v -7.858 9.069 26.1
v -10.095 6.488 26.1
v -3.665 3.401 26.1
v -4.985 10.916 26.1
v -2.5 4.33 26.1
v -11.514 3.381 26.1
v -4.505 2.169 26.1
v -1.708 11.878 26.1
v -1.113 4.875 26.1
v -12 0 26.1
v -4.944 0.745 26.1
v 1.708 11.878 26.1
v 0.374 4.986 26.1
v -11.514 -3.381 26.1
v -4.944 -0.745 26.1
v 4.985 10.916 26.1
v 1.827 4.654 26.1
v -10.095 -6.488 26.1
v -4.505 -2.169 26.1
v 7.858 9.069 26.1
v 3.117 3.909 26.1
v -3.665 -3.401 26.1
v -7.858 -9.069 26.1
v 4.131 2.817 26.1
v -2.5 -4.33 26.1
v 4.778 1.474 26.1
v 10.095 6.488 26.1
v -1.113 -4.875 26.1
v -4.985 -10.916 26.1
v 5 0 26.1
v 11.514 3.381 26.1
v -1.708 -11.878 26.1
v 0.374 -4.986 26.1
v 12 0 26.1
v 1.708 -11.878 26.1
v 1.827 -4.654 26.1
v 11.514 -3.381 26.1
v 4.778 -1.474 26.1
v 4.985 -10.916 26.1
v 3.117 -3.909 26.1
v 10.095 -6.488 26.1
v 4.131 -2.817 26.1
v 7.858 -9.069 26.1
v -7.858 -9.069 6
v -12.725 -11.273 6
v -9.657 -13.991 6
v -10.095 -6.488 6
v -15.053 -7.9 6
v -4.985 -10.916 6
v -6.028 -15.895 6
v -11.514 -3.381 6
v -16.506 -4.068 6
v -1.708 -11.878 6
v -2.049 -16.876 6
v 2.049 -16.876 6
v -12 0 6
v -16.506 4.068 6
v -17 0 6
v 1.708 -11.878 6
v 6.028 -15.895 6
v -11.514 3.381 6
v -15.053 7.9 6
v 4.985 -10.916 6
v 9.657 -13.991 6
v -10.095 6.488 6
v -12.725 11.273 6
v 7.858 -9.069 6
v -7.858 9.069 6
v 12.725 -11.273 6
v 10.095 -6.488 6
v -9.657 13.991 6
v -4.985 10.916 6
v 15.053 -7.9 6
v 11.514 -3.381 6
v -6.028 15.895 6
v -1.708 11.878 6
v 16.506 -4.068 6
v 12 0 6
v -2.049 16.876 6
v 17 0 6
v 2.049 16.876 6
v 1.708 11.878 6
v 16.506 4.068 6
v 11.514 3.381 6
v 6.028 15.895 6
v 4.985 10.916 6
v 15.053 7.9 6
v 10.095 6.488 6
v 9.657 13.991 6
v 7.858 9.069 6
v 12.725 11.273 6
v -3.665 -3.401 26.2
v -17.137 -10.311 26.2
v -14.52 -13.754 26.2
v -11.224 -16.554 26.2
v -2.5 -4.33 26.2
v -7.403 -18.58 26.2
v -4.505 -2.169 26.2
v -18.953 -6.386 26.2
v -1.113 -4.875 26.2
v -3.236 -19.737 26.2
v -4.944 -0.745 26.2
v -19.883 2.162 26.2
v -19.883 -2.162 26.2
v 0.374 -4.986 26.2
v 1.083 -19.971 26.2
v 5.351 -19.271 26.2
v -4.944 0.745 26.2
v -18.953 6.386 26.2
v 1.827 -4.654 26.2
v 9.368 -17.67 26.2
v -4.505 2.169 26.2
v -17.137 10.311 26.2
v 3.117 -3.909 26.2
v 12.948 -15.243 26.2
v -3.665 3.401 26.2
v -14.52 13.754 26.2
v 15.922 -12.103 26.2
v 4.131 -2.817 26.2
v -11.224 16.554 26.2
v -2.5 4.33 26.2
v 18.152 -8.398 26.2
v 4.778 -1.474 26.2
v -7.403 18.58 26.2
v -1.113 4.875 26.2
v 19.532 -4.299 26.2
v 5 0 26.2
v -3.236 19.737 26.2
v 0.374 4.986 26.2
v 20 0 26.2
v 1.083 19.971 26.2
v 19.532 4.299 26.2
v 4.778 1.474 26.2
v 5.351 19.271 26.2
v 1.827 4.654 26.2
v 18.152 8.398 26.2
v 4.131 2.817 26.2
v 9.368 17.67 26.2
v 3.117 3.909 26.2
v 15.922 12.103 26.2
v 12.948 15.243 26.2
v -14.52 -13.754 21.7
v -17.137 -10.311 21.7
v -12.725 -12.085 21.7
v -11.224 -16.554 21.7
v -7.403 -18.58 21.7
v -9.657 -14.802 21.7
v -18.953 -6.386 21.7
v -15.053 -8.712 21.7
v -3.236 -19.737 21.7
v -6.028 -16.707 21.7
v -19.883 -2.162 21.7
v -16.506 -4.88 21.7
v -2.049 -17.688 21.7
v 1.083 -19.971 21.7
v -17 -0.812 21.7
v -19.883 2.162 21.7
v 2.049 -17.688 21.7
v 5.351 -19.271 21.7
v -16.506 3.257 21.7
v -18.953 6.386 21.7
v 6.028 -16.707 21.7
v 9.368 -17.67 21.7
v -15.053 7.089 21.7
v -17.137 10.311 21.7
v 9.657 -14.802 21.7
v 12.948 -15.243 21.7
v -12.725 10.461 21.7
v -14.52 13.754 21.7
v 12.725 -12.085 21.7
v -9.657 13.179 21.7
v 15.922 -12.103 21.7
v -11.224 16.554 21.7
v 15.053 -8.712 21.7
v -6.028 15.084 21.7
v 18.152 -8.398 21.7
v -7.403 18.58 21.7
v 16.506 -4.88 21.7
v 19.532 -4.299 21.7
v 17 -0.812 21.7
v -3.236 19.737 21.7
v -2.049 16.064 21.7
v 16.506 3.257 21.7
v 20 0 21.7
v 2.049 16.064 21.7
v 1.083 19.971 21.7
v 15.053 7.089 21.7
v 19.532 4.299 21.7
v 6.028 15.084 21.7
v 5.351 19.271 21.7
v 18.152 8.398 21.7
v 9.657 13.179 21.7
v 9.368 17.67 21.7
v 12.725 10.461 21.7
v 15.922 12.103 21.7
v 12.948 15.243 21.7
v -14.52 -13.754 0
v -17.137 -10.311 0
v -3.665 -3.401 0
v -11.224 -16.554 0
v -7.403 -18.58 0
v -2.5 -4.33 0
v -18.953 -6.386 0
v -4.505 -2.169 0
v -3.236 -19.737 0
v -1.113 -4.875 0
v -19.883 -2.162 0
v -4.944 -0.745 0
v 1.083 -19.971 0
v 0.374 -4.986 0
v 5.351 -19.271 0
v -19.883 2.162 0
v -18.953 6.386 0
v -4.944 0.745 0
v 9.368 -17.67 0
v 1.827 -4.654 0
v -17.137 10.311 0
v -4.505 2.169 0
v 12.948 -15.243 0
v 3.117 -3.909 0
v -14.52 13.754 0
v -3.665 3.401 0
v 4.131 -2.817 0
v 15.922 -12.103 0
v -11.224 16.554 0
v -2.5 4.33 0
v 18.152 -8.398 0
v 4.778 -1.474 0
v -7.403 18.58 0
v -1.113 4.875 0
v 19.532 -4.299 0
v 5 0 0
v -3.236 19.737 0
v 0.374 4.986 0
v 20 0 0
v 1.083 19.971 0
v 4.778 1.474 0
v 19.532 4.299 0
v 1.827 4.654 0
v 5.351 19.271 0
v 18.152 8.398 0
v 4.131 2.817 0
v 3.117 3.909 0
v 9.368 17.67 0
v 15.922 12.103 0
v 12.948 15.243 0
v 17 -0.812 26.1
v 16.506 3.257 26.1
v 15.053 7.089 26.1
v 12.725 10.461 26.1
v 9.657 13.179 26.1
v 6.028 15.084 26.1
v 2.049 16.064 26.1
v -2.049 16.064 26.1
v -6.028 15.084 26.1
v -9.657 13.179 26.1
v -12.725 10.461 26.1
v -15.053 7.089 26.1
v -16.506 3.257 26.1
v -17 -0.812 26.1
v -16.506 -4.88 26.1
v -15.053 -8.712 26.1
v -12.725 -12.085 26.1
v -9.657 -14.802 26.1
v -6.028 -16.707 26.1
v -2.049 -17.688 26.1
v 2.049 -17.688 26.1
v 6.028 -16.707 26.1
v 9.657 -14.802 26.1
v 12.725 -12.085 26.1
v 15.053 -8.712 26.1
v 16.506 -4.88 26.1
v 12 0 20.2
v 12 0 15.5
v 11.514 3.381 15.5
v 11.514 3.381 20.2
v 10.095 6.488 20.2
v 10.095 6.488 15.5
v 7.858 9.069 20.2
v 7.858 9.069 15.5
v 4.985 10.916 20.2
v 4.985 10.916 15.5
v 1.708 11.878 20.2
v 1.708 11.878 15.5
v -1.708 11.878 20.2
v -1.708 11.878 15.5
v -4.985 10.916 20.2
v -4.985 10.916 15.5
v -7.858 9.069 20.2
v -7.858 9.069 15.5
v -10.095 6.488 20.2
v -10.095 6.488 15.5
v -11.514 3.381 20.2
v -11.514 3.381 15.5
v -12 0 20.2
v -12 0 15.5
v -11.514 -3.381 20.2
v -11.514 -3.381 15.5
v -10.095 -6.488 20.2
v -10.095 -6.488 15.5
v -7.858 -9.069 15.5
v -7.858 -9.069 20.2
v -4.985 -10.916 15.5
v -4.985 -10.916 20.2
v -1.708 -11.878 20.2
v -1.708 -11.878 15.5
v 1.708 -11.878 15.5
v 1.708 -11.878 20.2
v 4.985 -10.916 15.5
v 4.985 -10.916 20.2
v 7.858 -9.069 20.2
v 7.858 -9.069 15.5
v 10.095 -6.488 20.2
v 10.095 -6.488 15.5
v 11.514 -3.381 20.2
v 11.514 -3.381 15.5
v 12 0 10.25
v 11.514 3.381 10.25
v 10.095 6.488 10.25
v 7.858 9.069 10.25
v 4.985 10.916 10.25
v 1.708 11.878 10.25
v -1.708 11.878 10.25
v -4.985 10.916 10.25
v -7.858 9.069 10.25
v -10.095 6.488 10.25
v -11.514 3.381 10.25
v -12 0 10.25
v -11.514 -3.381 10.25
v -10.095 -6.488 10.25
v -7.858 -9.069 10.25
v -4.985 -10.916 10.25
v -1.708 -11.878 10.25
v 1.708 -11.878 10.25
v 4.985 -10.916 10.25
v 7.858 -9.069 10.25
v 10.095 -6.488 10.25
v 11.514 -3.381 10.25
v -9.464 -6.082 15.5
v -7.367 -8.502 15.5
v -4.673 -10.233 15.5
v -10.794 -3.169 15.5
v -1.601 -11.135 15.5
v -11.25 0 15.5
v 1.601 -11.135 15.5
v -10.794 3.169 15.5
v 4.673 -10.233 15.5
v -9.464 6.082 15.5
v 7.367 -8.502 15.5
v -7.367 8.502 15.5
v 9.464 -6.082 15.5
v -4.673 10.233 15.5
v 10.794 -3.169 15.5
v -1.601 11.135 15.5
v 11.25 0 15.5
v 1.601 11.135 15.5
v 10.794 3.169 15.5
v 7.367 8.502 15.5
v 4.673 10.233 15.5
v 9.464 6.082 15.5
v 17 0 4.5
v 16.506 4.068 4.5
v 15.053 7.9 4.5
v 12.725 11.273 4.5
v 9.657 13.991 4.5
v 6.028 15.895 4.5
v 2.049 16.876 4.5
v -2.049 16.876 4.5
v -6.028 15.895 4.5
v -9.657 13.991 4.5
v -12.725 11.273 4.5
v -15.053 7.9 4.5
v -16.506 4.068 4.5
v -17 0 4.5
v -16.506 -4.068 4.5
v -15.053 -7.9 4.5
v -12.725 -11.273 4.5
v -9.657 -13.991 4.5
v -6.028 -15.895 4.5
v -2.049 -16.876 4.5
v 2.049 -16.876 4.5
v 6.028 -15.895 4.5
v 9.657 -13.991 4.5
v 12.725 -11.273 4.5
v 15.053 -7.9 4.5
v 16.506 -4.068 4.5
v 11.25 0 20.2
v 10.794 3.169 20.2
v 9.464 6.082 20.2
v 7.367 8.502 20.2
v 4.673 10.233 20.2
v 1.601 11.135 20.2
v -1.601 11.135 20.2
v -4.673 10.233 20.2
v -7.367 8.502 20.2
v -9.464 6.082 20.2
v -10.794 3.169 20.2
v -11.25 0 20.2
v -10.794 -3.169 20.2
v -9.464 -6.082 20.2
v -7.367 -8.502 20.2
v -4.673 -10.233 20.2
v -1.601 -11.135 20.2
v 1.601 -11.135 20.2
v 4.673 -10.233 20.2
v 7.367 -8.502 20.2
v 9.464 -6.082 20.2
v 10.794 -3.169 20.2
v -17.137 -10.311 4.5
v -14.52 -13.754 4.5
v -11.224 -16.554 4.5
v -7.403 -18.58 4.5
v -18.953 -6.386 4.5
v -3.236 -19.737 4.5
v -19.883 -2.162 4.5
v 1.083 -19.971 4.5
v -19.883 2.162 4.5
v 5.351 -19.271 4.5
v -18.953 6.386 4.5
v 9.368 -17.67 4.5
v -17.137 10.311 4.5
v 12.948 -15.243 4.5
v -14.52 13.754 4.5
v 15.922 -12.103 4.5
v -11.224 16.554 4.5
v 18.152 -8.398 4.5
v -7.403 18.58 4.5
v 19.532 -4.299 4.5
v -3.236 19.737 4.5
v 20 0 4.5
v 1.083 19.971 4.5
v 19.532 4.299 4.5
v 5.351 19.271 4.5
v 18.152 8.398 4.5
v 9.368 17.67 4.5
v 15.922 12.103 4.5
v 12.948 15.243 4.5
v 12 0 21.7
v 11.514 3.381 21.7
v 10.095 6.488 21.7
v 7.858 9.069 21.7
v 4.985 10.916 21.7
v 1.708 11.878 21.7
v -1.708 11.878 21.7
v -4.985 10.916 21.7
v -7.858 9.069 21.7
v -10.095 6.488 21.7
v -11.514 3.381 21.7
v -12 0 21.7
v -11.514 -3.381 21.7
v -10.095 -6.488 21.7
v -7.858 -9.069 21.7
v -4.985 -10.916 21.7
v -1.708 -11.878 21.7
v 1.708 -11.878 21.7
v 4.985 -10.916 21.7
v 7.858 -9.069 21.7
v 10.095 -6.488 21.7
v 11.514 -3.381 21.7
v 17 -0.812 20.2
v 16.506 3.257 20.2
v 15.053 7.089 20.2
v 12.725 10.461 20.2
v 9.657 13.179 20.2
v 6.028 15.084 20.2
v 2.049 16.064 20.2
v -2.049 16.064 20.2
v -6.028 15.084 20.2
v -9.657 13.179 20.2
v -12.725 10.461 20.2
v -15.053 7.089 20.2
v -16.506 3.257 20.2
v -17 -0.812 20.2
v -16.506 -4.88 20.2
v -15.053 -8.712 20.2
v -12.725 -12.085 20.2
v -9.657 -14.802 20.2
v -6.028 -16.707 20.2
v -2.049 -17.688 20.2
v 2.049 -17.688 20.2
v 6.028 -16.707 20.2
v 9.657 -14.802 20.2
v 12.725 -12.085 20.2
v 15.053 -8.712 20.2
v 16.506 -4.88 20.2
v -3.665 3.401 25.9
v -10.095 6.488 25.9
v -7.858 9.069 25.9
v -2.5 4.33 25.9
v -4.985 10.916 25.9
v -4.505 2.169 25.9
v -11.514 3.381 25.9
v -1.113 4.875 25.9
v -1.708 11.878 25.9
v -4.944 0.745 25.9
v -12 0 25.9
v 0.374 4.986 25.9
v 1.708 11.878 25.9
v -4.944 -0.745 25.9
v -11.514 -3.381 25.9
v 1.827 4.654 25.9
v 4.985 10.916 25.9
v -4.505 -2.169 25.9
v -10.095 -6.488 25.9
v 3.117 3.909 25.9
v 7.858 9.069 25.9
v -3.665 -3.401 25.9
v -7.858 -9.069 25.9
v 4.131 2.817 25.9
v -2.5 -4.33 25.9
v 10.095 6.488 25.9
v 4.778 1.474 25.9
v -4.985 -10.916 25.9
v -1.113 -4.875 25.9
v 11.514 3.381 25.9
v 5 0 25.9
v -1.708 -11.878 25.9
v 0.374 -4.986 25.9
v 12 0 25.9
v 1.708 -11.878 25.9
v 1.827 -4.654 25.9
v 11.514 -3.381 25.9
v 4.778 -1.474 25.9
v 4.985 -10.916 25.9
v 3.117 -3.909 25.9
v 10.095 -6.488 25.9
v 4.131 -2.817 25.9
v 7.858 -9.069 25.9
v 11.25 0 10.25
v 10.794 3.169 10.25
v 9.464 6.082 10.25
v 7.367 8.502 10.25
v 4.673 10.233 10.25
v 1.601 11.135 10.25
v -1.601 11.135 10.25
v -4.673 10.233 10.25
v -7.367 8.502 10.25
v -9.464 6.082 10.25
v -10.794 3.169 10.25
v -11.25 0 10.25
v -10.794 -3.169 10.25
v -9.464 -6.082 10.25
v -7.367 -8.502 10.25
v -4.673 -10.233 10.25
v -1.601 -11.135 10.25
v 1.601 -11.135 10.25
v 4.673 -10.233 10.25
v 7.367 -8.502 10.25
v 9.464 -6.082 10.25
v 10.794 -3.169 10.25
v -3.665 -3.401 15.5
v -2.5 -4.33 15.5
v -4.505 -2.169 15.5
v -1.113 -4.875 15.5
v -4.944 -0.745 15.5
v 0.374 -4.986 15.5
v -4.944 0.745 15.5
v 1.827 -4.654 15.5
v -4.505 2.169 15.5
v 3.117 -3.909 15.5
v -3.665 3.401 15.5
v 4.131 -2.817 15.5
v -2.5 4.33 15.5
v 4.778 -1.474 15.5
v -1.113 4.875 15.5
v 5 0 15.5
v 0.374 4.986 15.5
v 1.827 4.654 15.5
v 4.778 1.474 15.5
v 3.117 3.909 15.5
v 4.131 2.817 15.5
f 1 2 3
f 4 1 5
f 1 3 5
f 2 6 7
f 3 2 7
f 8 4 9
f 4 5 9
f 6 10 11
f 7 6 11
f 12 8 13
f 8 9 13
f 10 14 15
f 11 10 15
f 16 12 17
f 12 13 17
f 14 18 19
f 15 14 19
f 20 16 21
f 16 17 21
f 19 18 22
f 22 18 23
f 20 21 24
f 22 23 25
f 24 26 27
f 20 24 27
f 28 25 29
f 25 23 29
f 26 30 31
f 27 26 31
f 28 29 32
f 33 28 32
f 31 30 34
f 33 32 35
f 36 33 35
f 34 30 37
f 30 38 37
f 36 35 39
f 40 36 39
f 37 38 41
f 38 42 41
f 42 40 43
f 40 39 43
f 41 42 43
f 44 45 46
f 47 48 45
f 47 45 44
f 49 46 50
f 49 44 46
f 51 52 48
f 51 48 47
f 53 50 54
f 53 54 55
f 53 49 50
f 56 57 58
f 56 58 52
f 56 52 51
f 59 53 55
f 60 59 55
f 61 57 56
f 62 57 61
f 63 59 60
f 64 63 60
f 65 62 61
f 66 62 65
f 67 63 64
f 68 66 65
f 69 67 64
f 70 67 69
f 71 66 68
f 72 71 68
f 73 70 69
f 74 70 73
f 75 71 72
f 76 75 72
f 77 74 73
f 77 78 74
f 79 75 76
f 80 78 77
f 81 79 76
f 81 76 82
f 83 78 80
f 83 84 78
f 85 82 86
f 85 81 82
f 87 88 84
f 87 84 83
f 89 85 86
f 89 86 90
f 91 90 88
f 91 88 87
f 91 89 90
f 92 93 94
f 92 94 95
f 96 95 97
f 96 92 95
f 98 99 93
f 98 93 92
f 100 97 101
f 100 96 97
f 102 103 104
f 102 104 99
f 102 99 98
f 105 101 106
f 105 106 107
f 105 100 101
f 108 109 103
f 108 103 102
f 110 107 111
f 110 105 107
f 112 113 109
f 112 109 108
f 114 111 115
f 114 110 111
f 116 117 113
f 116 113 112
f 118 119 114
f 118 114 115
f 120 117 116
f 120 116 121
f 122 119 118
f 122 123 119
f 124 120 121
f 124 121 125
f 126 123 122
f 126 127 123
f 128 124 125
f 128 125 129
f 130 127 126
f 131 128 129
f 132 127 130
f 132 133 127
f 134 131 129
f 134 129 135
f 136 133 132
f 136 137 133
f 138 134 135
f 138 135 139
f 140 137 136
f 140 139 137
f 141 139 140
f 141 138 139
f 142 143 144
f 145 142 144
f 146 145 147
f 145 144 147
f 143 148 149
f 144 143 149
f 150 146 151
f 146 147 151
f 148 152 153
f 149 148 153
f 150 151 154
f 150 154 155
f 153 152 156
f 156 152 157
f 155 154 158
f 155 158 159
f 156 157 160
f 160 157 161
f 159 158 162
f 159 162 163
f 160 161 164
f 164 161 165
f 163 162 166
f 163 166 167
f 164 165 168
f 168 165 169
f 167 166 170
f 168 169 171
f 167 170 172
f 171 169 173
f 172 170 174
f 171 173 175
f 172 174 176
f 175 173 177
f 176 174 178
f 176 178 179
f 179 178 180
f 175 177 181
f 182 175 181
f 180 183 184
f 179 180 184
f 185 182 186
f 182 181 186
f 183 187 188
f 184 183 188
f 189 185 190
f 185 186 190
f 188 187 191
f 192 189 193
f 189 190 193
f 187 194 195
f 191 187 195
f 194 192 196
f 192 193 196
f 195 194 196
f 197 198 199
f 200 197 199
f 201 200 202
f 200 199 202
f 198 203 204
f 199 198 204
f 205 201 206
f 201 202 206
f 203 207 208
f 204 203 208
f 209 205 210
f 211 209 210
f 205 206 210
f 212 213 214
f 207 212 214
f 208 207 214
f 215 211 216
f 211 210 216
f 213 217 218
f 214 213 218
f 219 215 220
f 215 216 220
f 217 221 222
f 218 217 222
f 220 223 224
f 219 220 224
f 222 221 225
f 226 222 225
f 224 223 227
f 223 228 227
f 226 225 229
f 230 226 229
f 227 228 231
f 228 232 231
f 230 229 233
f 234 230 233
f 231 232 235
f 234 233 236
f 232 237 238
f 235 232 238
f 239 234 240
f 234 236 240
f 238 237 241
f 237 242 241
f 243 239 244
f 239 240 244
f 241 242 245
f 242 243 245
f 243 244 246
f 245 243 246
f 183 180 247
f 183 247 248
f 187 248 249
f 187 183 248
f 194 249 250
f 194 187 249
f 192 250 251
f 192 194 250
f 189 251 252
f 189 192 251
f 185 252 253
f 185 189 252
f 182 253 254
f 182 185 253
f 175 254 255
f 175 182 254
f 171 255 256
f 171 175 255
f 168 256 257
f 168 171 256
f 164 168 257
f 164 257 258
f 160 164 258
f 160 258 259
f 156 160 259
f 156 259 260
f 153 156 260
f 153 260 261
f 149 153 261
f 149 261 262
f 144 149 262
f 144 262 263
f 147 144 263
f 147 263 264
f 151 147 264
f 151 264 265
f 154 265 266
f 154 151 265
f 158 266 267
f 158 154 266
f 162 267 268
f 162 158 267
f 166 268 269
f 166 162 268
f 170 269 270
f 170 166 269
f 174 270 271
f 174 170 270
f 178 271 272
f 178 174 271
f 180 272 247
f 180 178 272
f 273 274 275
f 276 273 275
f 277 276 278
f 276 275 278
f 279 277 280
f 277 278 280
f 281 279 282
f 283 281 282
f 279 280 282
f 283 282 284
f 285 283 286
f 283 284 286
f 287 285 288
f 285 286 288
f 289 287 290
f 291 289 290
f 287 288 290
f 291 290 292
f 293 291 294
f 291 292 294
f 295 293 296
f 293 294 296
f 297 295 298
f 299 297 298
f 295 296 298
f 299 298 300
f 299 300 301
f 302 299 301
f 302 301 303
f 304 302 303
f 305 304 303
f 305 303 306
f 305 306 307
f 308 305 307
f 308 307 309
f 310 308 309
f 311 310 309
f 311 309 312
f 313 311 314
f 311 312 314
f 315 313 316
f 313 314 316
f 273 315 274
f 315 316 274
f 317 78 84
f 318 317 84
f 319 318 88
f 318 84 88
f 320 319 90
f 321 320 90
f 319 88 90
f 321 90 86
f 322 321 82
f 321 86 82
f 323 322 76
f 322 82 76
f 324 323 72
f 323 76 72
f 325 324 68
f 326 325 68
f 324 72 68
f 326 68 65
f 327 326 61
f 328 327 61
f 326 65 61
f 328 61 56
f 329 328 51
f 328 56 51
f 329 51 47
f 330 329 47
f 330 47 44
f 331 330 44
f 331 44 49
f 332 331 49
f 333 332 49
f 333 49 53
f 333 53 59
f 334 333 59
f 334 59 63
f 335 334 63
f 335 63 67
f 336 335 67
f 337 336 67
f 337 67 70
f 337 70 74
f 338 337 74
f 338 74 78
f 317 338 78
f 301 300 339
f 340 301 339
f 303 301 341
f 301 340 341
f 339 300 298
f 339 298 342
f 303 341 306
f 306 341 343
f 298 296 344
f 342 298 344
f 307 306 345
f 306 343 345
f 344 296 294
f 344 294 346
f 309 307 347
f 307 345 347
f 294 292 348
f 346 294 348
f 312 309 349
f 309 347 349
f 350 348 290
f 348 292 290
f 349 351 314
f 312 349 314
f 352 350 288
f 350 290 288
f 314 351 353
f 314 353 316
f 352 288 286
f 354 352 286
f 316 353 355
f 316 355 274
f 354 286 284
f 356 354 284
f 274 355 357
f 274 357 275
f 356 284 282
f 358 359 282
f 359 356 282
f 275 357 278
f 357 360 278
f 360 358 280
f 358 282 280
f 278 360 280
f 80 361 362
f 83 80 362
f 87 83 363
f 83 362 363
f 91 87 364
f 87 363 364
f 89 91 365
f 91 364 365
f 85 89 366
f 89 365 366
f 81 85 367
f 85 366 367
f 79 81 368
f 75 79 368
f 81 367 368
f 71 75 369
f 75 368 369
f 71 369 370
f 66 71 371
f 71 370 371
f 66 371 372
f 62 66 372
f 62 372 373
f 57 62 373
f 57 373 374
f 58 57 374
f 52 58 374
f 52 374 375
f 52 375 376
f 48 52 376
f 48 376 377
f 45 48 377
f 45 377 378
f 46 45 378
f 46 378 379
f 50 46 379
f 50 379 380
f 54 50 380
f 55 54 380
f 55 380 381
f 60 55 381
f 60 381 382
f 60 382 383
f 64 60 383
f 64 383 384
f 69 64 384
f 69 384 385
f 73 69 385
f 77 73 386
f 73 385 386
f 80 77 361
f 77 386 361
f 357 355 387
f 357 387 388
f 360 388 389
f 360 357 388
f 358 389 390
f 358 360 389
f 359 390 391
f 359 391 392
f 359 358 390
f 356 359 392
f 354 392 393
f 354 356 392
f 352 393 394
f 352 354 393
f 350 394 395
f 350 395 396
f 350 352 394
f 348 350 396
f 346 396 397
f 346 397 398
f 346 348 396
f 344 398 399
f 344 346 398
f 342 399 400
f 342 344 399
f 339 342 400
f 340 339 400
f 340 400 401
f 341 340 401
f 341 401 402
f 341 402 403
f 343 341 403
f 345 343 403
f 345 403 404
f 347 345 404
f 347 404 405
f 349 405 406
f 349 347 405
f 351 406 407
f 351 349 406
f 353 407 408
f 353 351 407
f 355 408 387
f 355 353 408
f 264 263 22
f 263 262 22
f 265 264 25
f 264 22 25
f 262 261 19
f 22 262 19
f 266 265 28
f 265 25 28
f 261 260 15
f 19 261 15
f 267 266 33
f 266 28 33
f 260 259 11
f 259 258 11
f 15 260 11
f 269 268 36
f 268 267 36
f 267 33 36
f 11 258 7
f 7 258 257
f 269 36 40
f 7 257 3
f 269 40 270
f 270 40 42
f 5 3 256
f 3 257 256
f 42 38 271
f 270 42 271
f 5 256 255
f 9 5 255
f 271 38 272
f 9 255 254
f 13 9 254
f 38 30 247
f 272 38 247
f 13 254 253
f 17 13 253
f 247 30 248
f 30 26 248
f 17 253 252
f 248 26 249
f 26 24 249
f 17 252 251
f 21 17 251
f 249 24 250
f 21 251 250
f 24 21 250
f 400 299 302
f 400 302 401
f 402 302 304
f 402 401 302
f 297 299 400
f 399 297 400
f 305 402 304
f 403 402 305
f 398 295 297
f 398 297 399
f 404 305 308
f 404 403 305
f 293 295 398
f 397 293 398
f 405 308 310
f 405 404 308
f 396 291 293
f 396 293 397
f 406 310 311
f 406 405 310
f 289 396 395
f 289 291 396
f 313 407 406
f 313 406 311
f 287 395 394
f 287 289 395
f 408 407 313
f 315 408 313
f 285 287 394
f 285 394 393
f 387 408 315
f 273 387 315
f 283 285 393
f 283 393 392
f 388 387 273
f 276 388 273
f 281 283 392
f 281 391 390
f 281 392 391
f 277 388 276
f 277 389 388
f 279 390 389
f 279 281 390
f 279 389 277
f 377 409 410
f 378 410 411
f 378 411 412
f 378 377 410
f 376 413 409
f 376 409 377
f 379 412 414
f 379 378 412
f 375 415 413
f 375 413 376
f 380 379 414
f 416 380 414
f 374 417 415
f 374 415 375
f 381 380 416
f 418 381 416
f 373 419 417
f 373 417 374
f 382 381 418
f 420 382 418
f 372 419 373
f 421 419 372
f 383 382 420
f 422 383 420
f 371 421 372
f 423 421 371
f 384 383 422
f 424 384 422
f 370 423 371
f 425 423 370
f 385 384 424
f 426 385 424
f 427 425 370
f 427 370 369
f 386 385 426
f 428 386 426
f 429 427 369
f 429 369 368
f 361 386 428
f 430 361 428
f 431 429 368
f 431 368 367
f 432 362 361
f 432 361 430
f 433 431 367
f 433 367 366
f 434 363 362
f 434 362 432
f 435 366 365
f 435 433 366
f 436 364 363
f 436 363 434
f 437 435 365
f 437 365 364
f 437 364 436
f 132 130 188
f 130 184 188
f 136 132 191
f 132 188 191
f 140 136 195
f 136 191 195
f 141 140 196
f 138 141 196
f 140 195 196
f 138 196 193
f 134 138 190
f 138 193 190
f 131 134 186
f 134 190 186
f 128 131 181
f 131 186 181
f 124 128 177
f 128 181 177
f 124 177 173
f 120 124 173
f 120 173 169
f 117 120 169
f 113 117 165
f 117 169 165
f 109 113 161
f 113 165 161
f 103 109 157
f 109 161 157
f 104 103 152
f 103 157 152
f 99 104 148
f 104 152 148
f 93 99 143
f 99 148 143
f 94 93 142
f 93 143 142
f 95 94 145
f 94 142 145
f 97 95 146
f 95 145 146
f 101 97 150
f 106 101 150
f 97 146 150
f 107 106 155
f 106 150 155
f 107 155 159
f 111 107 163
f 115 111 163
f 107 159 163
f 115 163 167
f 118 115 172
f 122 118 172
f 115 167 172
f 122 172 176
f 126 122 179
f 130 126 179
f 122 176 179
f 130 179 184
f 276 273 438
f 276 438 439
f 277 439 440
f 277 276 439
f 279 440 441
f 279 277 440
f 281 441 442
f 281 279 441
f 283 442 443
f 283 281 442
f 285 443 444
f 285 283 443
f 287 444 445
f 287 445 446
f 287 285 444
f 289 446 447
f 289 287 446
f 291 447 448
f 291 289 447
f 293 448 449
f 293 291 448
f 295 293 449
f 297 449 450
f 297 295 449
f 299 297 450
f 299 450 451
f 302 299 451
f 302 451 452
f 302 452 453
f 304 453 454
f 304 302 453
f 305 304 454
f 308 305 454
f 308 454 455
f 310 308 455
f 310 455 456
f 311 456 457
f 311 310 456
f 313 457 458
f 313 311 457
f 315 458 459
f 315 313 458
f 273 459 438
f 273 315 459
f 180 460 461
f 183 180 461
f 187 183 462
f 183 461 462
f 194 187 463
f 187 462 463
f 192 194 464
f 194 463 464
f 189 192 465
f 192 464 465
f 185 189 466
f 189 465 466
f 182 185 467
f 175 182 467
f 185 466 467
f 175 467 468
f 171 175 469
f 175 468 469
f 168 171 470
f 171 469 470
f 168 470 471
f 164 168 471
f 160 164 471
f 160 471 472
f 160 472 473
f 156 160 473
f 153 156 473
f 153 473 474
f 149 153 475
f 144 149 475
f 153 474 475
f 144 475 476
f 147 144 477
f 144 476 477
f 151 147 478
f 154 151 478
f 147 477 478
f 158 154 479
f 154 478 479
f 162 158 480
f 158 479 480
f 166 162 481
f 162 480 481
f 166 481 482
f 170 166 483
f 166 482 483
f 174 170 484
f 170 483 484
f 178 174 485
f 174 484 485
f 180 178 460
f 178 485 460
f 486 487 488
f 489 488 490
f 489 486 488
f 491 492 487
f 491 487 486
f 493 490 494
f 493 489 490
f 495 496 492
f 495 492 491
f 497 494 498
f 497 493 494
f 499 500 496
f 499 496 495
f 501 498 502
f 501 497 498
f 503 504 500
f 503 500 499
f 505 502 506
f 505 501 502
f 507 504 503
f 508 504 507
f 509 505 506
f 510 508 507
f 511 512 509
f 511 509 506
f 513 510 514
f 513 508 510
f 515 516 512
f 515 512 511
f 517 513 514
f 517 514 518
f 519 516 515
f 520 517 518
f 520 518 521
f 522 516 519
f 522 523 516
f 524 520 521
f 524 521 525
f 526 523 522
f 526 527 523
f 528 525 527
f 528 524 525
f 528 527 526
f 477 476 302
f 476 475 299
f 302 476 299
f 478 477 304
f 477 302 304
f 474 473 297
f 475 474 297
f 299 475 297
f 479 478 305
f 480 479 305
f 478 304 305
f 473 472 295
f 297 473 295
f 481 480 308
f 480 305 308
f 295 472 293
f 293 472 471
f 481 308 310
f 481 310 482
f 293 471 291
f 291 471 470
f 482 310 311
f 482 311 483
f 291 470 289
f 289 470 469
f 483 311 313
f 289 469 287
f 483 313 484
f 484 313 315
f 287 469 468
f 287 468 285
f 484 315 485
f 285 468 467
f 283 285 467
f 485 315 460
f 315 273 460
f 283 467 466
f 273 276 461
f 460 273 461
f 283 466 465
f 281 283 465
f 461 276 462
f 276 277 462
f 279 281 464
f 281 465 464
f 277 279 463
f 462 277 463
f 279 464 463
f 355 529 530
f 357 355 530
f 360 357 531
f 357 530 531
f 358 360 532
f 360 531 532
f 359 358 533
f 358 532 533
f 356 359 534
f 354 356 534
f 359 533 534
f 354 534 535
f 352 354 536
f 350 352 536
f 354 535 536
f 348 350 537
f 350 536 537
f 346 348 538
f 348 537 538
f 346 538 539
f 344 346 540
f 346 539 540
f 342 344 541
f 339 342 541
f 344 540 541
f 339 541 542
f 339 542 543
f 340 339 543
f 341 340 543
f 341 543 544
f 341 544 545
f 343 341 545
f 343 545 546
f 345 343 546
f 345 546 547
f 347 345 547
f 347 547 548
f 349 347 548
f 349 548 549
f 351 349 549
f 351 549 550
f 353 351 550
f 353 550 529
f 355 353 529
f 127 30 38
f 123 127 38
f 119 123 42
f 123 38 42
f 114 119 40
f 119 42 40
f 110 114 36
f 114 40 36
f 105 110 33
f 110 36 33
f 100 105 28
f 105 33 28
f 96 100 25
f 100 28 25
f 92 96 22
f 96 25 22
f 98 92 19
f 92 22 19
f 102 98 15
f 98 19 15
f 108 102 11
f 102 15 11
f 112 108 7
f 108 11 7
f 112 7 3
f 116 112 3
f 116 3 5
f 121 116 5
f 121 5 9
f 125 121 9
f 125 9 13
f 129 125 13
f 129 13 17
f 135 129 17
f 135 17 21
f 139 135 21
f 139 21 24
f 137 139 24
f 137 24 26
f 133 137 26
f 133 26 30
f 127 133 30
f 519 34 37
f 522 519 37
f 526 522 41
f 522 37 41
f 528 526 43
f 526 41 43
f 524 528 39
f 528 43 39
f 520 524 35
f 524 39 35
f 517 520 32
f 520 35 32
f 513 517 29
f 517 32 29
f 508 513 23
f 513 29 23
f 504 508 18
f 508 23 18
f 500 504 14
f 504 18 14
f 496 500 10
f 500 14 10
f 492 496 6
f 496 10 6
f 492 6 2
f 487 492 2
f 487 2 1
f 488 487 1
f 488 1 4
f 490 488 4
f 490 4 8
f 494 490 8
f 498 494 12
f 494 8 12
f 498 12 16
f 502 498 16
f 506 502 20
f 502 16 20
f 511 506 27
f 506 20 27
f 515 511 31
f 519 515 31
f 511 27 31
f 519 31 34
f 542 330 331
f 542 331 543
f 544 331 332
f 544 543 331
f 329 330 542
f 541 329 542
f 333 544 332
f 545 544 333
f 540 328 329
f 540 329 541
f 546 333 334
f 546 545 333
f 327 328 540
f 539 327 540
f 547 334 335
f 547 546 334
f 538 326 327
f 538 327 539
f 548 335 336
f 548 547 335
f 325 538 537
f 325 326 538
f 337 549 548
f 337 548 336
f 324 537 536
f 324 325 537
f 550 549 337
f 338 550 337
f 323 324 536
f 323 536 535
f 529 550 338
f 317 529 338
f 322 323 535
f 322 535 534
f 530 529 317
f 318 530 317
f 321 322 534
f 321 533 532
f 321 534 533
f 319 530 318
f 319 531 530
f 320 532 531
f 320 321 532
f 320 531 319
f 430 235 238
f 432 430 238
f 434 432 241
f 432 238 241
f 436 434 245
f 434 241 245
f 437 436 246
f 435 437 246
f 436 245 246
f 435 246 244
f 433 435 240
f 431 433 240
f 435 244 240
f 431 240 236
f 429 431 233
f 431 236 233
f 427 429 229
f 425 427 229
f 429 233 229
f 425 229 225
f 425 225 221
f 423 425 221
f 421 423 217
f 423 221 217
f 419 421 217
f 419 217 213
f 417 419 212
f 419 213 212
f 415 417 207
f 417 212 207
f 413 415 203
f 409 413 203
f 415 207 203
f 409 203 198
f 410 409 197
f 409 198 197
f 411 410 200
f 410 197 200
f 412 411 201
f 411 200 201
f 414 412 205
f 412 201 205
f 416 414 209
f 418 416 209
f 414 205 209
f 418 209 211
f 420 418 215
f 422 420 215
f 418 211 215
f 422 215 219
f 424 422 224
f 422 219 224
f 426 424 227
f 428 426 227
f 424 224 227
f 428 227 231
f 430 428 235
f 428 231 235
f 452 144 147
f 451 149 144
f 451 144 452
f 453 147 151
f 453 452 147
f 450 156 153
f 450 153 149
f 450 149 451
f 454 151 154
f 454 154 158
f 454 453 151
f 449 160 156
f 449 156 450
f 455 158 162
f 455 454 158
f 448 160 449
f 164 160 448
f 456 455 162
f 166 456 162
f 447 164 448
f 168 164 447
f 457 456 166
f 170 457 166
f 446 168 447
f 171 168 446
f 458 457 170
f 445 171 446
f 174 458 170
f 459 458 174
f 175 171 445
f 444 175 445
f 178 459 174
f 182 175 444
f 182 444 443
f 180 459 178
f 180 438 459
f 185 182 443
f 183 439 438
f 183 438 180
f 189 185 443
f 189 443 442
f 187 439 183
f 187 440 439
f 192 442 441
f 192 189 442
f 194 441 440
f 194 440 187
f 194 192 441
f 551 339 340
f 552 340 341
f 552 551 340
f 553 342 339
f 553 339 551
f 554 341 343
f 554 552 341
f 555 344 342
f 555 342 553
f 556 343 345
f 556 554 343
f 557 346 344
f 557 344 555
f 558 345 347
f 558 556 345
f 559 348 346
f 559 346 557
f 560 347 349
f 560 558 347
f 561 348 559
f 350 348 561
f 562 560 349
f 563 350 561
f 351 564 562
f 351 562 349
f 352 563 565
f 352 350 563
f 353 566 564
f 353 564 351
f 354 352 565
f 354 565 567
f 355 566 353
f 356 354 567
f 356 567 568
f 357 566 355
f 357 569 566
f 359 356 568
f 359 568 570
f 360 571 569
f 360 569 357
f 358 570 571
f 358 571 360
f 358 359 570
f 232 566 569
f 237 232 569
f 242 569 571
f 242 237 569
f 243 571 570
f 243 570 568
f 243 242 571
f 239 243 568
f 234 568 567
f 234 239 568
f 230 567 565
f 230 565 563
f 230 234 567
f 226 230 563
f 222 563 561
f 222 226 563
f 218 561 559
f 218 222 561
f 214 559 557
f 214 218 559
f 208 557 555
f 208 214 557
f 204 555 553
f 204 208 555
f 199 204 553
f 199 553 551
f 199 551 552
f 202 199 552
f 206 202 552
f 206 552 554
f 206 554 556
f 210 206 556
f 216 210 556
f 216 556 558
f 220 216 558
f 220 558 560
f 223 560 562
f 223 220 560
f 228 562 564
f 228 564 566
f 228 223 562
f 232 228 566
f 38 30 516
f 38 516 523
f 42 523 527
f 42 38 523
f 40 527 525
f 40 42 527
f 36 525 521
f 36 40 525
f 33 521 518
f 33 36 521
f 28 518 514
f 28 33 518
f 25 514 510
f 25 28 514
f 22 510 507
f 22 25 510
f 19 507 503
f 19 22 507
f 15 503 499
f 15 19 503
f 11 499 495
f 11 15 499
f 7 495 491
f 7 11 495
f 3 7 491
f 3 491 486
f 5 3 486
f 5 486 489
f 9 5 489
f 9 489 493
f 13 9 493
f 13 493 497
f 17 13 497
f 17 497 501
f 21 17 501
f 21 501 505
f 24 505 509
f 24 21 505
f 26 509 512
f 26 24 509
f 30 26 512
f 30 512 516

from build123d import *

# Parameters (mm, degrees)
F0_R      = 20
F0_R_2    = 17
F1_DEPTH  = 4.5
F0_R_3    = 12
F2_DEPTH  = 6
F0_R_4    = 11.25
F3_DEPTH  = 10.25
F0_R_5    = 5
F4_DEPTH  = 15.5
F5_R      = 12
F5_R_2    = 11.25
F6_DEPTH  = 4.7
F7_R      = 17
F7_R_2    = 12
F8_DEPTH  = 1.5
F9_R      = 20
F9_R_2    = 17
F10_DEPTH = 4.5
F11_R     = 20
F12_DEPTH = 0.1
F13_R     = 5
F14_DEPTH = 79
F15_R     = 12
F15_R_2   = 5
F16_DEPTH = 0.2


with BuildPart() as f1:
    # F0 (on Top) → F1 (new body)
    with BuildSketch(Plane.XY):
        Circle(F0_R)
        Circle(F0_R_2, mode=Mode.SUBTRACT)
    extrude(amount=F1_DEPTH)

    # F0 (on Top) → F2 (join)
    with BuildSketch(Plane.XY):
        Circle(F0_R_2)
        Circle(F0_R_3, mode=Mode.SUBTRACT)
    extrude(amount=F2_DEPTH)

    # F0 (on Top) → F3 (join)
    with BuildSketch(Plane.XY):
        Circle(F0_R_3)
        Circle(F0_R_4, mode=Mode.SUBTRACT)
    extrude(amount=F3_DEPTH)

    # F0 (on Top) → F4 (join)
    with BuildSketch(Plane.XY):
        Circle(F0_R_4)
        Circle(F0_R_5, mode=Mode.SUBTRACT)
    extrude(amount=F4_DEPTH)

    # F5 (on face) → F6 (join)
    with BuildSketch(Plane.XY.offset(15.5)):
        Circle(F5_R)
        Circle(F5_R_2, mode=Mode.SUBTRACT)
    extrude(amount=F6_DEPTH)


with BuildPart() as f8:
    # F7 (on face) → F8 (new body)
    with BuildSketch(Plane.XY.offset(20.2)):
        with Locations((0, -0.8117613615)):
            Circle(F7_R)
        Circle(F7_R_2, mode=Mode.SUBTRACT)
    extrude(amount=F8_DEPTH)


with BuildPart() as f10:
    # F9 (on face) → F10 (new body)
    with BuildSketch(Plane.XY.offset(21.7)):
        Circle(F9_R)
        with Locations((0, -0.8117613615)):
            Circle(F9_R_2, mode=Mode.SUBTRACT)
    extrude(amount=F10_DEPTH)

    # F11 (on face) → F12 (join)
    with BuildSketch(Plane.XY.offset(26.2)):
        Circle(F11_R)
    extrude(amount=-F12_DEPTH)

    # F13 (on face) → F14 (cut)
    with BuildSketch(Plane(origin=(0, 0, 26.1), x_dir=(1, 0, 0), z_dir=(0, 0, -1))):
        Circle(F13_R)
    extrude(amount=-F14_DEPTH, mode=Mode.SUBTRACT)


with BuildPart() as f16:
    # F15 (on face) → F16 (new body)
    with BuildSketch(Plane(origin=(0, 0, 26.1), x_dir=(1, 0, 0), z_dir=(0, 0, -1))):
        Circle(F15_R)
        Circle(F15_R_2, mode=Mode.SUBTRACT)
    extrude(amount=F16_DEPTH)


solid = Compound([f1.part, f8.part, f10.part, f16.part])
